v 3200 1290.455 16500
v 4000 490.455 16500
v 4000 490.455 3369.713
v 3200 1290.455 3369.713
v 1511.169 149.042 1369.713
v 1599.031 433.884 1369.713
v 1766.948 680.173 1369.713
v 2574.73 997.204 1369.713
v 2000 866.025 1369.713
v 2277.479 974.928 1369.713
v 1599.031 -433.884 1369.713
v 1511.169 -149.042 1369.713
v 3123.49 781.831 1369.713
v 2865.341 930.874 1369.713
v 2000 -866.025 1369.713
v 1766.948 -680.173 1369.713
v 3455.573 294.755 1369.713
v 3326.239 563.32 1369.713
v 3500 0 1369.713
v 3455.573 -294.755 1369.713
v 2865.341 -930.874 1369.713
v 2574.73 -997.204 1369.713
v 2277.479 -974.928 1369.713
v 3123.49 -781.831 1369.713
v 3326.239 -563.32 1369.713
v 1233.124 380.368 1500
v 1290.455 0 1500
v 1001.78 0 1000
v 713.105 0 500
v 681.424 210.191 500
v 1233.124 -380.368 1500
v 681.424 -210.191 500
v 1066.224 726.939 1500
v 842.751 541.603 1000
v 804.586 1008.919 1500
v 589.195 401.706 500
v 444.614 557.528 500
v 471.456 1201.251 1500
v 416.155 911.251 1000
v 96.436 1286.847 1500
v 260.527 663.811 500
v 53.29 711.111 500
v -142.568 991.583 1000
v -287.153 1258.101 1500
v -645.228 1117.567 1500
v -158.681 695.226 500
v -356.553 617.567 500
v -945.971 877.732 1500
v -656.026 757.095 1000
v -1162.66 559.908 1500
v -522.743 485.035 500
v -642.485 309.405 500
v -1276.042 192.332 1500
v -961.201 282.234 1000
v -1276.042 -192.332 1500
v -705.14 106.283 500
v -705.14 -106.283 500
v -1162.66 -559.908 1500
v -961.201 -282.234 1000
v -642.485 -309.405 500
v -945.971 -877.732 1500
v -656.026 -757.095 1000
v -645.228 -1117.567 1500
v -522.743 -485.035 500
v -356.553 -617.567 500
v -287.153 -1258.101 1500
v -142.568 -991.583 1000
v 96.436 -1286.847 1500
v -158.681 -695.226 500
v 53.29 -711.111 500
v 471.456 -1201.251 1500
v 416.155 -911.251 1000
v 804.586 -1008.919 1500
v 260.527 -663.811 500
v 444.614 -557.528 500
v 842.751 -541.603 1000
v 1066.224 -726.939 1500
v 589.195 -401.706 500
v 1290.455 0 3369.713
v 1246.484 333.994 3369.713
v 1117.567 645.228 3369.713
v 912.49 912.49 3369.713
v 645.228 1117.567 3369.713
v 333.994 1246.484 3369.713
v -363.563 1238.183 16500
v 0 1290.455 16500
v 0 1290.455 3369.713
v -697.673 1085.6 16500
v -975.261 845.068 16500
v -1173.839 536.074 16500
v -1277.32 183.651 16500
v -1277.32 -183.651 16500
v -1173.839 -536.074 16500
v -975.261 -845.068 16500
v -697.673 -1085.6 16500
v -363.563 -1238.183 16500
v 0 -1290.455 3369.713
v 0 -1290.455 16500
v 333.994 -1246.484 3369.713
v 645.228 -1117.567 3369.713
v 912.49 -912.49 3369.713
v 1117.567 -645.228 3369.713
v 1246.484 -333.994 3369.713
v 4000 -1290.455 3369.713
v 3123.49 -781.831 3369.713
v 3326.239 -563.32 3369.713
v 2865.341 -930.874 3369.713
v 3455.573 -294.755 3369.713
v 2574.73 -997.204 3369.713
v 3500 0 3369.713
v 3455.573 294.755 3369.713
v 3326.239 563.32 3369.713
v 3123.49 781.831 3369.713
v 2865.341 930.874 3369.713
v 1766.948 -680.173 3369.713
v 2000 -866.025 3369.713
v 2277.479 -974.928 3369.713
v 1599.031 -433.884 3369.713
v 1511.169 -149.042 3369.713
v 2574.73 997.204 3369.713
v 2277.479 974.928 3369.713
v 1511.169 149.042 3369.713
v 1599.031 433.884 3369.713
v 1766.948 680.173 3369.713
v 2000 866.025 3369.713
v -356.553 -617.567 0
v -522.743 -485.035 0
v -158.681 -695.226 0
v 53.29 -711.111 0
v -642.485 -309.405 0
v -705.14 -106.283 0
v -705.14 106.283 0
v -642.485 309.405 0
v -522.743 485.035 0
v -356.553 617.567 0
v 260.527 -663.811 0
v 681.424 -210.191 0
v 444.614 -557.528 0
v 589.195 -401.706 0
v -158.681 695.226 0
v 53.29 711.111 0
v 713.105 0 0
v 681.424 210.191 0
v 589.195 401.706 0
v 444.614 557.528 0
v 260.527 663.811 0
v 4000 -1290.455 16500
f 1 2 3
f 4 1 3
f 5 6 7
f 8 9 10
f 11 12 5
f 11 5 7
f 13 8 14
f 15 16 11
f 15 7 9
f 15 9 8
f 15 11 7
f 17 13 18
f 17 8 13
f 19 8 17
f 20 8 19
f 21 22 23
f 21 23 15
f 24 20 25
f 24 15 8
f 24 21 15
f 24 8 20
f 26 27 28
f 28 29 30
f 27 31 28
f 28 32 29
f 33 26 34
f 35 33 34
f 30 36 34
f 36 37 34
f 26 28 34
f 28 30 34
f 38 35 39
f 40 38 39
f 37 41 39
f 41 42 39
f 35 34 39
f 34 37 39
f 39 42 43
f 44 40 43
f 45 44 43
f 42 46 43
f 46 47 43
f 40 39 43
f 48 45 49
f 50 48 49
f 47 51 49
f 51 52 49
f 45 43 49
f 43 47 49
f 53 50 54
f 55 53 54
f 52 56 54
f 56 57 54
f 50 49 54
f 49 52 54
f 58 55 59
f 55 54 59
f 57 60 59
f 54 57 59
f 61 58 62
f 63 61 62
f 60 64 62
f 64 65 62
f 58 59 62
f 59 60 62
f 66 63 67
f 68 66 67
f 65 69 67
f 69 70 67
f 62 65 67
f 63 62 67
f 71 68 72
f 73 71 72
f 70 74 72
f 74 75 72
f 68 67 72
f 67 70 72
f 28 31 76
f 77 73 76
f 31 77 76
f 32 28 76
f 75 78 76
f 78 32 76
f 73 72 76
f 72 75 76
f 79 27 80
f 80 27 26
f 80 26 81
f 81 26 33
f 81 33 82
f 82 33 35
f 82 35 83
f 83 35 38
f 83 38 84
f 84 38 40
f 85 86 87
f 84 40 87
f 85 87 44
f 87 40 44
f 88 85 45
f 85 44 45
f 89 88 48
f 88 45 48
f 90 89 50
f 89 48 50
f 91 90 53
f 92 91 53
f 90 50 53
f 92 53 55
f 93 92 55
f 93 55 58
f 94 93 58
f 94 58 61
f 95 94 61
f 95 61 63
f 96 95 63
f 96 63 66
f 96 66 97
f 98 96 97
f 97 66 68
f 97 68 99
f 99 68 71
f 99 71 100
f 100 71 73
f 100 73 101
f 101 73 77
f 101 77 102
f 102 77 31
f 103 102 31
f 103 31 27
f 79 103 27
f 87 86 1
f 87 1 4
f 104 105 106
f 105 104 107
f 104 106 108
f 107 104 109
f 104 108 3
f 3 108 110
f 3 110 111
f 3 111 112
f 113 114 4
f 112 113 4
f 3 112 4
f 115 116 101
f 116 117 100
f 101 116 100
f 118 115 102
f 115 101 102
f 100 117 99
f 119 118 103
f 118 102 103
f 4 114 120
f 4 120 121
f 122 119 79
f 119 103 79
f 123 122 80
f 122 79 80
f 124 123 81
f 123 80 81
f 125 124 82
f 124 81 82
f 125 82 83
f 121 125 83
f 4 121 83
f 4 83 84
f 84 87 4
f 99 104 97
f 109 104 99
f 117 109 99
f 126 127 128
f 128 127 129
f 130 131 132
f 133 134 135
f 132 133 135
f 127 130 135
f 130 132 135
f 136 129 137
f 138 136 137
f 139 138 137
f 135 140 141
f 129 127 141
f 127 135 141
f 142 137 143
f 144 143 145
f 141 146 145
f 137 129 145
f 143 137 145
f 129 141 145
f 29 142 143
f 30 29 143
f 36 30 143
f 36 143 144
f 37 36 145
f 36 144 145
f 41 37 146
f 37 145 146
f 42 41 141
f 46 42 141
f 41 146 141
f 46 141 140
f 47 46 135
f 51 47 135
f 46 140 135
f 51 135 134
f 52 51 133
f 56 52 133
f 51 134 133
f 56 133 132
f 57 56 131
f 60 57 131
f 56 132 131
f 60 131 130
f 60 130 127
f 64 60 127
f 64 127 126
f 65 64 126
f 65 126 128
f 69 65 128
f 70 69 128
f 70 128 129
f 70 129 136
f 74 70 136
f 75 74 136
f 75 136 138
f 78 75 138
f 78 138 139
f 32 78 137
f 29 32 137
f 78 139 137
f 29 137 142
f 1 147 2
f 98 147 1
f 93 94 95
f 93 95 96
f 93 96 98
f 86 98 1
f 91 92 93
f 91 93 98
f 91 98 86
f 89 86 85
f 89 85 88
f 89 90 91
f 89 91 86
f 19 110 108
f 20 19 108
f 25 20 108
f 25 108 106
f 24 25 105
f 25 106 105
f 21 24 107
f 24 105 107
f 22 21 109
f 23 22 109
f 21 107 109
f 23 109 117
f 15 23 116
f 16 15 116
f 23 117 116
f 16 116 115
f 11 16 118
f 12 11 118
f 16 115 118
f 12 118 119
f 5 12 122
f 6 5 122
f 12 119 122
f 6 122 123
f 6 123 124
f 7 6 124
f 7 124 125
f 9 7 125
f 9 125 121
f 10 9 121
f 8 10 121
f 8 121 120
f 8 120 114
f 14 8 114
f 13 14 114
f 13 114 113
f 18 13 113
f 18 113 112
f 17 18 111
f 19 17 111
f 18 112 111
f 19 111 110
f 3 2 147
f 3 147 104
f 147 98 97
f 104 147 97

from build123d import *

# Parameters (mm, degrees)
SKETCH1_R           = 713.105
BOSS_EXTRUDE1_DEPTH = 500
SKETCH2_R           = 713.105
BOSS_EXTRUDE3_DEPTH = 1000
BOSS_EXTRUDE3_DRAFT = -30
SKETCH3_R           = 1290.45526919
BOSS_EXTRUDE4_DEPTH = 15000
SKETCH5_W           = 13130.287461106
SKETCH5_H           = 2580.91053838
BOSS_EXTRUDE5_DEPTH = 4000
SKETCH6_R           = 1000
BOSS_EXTRUDE6_DEPTH = 2000
CHAMFER1_SIZE       = 800


with BuildPart() as part:
    # Sketch1 → Boss-Extrude1 (new body)
    with BuildSketch(Plane.XY):
        Circle(SKETCH1_R)
    extrude(amount=BOSS_EXTRUDE1_DEPTH)


with BuildPart() as boss_extrude3_tool:
    # Sketch2 → Boss-Extrude3 (with draft: the straight prism first)
    with BuildSketch(Plane.XY.offset(500)):
        Circle(SKETCH2_R)
    extrude(amount=BOSS_EXTRUDE3_DEPTH)
    # Boss-Extrude3: the draft: its side faces are tilted about the plane it starts from
    boss_extrude3_sides = [boss_extrude3_tool.faces().sort_by_distance(p)[0] for p in [
        (-713.105, 0, 1000),
    ]]
    draft(boss_extrude3_sides, Plane.XY.offset(500), BOSS_EXTRUDE3_DRAFT)


with BuildPart() as part_1:
    add(part.part)

    # Boss-Extrude3: add boss_extrude3_tool
    add(boss_extrude3_tool.part)

    # Sketch3 → Boss-Extrude4 (add)
    with BuildSketch(Plane.XY.offset(1500)):
        Circle(SKETCH3_R)
    extrude(amount=BOSS_EXTRUDE4_DEPTH)

    # Sketch5 → Boss-Extrude5 (add)
    with BuildSketch(Plane(origin=(0, 0, 0), x_dir=(0, 0, -1), z_dir=(1, 0, 0))):
        with Locations((-9934.856269447, 0)):
            Rectangle(SKETCH5_W, SKETCH5_H)
    extrude(amount=BOSS_EXTRUDE5_DEPTH)

    # Sketch6 → Boss-Extrude6 (add)
    with BuildSketch(Plane(origin=(0, 0, 3369.712538894), x_dir=(-1, 0, 0), z_dir=(0, 0, -1))):
        with Locations(Location((-2500, 0, 0), (0, 0, 180))):
            Circle(SKETCH6_R)
    extrude(amount=BOSS_EXTRUDE6_DEPTH)

    # Chamfer1
    chamfer1_edges = [part_1.edges().sort_by_distance(p)[0] for p in [
        (4000, 1290.45526919, 9934.856269447),
    ]]
    chamfer(chamfer1_edges, length=CHAMFER1_SIZE)


solid = part_1.part
